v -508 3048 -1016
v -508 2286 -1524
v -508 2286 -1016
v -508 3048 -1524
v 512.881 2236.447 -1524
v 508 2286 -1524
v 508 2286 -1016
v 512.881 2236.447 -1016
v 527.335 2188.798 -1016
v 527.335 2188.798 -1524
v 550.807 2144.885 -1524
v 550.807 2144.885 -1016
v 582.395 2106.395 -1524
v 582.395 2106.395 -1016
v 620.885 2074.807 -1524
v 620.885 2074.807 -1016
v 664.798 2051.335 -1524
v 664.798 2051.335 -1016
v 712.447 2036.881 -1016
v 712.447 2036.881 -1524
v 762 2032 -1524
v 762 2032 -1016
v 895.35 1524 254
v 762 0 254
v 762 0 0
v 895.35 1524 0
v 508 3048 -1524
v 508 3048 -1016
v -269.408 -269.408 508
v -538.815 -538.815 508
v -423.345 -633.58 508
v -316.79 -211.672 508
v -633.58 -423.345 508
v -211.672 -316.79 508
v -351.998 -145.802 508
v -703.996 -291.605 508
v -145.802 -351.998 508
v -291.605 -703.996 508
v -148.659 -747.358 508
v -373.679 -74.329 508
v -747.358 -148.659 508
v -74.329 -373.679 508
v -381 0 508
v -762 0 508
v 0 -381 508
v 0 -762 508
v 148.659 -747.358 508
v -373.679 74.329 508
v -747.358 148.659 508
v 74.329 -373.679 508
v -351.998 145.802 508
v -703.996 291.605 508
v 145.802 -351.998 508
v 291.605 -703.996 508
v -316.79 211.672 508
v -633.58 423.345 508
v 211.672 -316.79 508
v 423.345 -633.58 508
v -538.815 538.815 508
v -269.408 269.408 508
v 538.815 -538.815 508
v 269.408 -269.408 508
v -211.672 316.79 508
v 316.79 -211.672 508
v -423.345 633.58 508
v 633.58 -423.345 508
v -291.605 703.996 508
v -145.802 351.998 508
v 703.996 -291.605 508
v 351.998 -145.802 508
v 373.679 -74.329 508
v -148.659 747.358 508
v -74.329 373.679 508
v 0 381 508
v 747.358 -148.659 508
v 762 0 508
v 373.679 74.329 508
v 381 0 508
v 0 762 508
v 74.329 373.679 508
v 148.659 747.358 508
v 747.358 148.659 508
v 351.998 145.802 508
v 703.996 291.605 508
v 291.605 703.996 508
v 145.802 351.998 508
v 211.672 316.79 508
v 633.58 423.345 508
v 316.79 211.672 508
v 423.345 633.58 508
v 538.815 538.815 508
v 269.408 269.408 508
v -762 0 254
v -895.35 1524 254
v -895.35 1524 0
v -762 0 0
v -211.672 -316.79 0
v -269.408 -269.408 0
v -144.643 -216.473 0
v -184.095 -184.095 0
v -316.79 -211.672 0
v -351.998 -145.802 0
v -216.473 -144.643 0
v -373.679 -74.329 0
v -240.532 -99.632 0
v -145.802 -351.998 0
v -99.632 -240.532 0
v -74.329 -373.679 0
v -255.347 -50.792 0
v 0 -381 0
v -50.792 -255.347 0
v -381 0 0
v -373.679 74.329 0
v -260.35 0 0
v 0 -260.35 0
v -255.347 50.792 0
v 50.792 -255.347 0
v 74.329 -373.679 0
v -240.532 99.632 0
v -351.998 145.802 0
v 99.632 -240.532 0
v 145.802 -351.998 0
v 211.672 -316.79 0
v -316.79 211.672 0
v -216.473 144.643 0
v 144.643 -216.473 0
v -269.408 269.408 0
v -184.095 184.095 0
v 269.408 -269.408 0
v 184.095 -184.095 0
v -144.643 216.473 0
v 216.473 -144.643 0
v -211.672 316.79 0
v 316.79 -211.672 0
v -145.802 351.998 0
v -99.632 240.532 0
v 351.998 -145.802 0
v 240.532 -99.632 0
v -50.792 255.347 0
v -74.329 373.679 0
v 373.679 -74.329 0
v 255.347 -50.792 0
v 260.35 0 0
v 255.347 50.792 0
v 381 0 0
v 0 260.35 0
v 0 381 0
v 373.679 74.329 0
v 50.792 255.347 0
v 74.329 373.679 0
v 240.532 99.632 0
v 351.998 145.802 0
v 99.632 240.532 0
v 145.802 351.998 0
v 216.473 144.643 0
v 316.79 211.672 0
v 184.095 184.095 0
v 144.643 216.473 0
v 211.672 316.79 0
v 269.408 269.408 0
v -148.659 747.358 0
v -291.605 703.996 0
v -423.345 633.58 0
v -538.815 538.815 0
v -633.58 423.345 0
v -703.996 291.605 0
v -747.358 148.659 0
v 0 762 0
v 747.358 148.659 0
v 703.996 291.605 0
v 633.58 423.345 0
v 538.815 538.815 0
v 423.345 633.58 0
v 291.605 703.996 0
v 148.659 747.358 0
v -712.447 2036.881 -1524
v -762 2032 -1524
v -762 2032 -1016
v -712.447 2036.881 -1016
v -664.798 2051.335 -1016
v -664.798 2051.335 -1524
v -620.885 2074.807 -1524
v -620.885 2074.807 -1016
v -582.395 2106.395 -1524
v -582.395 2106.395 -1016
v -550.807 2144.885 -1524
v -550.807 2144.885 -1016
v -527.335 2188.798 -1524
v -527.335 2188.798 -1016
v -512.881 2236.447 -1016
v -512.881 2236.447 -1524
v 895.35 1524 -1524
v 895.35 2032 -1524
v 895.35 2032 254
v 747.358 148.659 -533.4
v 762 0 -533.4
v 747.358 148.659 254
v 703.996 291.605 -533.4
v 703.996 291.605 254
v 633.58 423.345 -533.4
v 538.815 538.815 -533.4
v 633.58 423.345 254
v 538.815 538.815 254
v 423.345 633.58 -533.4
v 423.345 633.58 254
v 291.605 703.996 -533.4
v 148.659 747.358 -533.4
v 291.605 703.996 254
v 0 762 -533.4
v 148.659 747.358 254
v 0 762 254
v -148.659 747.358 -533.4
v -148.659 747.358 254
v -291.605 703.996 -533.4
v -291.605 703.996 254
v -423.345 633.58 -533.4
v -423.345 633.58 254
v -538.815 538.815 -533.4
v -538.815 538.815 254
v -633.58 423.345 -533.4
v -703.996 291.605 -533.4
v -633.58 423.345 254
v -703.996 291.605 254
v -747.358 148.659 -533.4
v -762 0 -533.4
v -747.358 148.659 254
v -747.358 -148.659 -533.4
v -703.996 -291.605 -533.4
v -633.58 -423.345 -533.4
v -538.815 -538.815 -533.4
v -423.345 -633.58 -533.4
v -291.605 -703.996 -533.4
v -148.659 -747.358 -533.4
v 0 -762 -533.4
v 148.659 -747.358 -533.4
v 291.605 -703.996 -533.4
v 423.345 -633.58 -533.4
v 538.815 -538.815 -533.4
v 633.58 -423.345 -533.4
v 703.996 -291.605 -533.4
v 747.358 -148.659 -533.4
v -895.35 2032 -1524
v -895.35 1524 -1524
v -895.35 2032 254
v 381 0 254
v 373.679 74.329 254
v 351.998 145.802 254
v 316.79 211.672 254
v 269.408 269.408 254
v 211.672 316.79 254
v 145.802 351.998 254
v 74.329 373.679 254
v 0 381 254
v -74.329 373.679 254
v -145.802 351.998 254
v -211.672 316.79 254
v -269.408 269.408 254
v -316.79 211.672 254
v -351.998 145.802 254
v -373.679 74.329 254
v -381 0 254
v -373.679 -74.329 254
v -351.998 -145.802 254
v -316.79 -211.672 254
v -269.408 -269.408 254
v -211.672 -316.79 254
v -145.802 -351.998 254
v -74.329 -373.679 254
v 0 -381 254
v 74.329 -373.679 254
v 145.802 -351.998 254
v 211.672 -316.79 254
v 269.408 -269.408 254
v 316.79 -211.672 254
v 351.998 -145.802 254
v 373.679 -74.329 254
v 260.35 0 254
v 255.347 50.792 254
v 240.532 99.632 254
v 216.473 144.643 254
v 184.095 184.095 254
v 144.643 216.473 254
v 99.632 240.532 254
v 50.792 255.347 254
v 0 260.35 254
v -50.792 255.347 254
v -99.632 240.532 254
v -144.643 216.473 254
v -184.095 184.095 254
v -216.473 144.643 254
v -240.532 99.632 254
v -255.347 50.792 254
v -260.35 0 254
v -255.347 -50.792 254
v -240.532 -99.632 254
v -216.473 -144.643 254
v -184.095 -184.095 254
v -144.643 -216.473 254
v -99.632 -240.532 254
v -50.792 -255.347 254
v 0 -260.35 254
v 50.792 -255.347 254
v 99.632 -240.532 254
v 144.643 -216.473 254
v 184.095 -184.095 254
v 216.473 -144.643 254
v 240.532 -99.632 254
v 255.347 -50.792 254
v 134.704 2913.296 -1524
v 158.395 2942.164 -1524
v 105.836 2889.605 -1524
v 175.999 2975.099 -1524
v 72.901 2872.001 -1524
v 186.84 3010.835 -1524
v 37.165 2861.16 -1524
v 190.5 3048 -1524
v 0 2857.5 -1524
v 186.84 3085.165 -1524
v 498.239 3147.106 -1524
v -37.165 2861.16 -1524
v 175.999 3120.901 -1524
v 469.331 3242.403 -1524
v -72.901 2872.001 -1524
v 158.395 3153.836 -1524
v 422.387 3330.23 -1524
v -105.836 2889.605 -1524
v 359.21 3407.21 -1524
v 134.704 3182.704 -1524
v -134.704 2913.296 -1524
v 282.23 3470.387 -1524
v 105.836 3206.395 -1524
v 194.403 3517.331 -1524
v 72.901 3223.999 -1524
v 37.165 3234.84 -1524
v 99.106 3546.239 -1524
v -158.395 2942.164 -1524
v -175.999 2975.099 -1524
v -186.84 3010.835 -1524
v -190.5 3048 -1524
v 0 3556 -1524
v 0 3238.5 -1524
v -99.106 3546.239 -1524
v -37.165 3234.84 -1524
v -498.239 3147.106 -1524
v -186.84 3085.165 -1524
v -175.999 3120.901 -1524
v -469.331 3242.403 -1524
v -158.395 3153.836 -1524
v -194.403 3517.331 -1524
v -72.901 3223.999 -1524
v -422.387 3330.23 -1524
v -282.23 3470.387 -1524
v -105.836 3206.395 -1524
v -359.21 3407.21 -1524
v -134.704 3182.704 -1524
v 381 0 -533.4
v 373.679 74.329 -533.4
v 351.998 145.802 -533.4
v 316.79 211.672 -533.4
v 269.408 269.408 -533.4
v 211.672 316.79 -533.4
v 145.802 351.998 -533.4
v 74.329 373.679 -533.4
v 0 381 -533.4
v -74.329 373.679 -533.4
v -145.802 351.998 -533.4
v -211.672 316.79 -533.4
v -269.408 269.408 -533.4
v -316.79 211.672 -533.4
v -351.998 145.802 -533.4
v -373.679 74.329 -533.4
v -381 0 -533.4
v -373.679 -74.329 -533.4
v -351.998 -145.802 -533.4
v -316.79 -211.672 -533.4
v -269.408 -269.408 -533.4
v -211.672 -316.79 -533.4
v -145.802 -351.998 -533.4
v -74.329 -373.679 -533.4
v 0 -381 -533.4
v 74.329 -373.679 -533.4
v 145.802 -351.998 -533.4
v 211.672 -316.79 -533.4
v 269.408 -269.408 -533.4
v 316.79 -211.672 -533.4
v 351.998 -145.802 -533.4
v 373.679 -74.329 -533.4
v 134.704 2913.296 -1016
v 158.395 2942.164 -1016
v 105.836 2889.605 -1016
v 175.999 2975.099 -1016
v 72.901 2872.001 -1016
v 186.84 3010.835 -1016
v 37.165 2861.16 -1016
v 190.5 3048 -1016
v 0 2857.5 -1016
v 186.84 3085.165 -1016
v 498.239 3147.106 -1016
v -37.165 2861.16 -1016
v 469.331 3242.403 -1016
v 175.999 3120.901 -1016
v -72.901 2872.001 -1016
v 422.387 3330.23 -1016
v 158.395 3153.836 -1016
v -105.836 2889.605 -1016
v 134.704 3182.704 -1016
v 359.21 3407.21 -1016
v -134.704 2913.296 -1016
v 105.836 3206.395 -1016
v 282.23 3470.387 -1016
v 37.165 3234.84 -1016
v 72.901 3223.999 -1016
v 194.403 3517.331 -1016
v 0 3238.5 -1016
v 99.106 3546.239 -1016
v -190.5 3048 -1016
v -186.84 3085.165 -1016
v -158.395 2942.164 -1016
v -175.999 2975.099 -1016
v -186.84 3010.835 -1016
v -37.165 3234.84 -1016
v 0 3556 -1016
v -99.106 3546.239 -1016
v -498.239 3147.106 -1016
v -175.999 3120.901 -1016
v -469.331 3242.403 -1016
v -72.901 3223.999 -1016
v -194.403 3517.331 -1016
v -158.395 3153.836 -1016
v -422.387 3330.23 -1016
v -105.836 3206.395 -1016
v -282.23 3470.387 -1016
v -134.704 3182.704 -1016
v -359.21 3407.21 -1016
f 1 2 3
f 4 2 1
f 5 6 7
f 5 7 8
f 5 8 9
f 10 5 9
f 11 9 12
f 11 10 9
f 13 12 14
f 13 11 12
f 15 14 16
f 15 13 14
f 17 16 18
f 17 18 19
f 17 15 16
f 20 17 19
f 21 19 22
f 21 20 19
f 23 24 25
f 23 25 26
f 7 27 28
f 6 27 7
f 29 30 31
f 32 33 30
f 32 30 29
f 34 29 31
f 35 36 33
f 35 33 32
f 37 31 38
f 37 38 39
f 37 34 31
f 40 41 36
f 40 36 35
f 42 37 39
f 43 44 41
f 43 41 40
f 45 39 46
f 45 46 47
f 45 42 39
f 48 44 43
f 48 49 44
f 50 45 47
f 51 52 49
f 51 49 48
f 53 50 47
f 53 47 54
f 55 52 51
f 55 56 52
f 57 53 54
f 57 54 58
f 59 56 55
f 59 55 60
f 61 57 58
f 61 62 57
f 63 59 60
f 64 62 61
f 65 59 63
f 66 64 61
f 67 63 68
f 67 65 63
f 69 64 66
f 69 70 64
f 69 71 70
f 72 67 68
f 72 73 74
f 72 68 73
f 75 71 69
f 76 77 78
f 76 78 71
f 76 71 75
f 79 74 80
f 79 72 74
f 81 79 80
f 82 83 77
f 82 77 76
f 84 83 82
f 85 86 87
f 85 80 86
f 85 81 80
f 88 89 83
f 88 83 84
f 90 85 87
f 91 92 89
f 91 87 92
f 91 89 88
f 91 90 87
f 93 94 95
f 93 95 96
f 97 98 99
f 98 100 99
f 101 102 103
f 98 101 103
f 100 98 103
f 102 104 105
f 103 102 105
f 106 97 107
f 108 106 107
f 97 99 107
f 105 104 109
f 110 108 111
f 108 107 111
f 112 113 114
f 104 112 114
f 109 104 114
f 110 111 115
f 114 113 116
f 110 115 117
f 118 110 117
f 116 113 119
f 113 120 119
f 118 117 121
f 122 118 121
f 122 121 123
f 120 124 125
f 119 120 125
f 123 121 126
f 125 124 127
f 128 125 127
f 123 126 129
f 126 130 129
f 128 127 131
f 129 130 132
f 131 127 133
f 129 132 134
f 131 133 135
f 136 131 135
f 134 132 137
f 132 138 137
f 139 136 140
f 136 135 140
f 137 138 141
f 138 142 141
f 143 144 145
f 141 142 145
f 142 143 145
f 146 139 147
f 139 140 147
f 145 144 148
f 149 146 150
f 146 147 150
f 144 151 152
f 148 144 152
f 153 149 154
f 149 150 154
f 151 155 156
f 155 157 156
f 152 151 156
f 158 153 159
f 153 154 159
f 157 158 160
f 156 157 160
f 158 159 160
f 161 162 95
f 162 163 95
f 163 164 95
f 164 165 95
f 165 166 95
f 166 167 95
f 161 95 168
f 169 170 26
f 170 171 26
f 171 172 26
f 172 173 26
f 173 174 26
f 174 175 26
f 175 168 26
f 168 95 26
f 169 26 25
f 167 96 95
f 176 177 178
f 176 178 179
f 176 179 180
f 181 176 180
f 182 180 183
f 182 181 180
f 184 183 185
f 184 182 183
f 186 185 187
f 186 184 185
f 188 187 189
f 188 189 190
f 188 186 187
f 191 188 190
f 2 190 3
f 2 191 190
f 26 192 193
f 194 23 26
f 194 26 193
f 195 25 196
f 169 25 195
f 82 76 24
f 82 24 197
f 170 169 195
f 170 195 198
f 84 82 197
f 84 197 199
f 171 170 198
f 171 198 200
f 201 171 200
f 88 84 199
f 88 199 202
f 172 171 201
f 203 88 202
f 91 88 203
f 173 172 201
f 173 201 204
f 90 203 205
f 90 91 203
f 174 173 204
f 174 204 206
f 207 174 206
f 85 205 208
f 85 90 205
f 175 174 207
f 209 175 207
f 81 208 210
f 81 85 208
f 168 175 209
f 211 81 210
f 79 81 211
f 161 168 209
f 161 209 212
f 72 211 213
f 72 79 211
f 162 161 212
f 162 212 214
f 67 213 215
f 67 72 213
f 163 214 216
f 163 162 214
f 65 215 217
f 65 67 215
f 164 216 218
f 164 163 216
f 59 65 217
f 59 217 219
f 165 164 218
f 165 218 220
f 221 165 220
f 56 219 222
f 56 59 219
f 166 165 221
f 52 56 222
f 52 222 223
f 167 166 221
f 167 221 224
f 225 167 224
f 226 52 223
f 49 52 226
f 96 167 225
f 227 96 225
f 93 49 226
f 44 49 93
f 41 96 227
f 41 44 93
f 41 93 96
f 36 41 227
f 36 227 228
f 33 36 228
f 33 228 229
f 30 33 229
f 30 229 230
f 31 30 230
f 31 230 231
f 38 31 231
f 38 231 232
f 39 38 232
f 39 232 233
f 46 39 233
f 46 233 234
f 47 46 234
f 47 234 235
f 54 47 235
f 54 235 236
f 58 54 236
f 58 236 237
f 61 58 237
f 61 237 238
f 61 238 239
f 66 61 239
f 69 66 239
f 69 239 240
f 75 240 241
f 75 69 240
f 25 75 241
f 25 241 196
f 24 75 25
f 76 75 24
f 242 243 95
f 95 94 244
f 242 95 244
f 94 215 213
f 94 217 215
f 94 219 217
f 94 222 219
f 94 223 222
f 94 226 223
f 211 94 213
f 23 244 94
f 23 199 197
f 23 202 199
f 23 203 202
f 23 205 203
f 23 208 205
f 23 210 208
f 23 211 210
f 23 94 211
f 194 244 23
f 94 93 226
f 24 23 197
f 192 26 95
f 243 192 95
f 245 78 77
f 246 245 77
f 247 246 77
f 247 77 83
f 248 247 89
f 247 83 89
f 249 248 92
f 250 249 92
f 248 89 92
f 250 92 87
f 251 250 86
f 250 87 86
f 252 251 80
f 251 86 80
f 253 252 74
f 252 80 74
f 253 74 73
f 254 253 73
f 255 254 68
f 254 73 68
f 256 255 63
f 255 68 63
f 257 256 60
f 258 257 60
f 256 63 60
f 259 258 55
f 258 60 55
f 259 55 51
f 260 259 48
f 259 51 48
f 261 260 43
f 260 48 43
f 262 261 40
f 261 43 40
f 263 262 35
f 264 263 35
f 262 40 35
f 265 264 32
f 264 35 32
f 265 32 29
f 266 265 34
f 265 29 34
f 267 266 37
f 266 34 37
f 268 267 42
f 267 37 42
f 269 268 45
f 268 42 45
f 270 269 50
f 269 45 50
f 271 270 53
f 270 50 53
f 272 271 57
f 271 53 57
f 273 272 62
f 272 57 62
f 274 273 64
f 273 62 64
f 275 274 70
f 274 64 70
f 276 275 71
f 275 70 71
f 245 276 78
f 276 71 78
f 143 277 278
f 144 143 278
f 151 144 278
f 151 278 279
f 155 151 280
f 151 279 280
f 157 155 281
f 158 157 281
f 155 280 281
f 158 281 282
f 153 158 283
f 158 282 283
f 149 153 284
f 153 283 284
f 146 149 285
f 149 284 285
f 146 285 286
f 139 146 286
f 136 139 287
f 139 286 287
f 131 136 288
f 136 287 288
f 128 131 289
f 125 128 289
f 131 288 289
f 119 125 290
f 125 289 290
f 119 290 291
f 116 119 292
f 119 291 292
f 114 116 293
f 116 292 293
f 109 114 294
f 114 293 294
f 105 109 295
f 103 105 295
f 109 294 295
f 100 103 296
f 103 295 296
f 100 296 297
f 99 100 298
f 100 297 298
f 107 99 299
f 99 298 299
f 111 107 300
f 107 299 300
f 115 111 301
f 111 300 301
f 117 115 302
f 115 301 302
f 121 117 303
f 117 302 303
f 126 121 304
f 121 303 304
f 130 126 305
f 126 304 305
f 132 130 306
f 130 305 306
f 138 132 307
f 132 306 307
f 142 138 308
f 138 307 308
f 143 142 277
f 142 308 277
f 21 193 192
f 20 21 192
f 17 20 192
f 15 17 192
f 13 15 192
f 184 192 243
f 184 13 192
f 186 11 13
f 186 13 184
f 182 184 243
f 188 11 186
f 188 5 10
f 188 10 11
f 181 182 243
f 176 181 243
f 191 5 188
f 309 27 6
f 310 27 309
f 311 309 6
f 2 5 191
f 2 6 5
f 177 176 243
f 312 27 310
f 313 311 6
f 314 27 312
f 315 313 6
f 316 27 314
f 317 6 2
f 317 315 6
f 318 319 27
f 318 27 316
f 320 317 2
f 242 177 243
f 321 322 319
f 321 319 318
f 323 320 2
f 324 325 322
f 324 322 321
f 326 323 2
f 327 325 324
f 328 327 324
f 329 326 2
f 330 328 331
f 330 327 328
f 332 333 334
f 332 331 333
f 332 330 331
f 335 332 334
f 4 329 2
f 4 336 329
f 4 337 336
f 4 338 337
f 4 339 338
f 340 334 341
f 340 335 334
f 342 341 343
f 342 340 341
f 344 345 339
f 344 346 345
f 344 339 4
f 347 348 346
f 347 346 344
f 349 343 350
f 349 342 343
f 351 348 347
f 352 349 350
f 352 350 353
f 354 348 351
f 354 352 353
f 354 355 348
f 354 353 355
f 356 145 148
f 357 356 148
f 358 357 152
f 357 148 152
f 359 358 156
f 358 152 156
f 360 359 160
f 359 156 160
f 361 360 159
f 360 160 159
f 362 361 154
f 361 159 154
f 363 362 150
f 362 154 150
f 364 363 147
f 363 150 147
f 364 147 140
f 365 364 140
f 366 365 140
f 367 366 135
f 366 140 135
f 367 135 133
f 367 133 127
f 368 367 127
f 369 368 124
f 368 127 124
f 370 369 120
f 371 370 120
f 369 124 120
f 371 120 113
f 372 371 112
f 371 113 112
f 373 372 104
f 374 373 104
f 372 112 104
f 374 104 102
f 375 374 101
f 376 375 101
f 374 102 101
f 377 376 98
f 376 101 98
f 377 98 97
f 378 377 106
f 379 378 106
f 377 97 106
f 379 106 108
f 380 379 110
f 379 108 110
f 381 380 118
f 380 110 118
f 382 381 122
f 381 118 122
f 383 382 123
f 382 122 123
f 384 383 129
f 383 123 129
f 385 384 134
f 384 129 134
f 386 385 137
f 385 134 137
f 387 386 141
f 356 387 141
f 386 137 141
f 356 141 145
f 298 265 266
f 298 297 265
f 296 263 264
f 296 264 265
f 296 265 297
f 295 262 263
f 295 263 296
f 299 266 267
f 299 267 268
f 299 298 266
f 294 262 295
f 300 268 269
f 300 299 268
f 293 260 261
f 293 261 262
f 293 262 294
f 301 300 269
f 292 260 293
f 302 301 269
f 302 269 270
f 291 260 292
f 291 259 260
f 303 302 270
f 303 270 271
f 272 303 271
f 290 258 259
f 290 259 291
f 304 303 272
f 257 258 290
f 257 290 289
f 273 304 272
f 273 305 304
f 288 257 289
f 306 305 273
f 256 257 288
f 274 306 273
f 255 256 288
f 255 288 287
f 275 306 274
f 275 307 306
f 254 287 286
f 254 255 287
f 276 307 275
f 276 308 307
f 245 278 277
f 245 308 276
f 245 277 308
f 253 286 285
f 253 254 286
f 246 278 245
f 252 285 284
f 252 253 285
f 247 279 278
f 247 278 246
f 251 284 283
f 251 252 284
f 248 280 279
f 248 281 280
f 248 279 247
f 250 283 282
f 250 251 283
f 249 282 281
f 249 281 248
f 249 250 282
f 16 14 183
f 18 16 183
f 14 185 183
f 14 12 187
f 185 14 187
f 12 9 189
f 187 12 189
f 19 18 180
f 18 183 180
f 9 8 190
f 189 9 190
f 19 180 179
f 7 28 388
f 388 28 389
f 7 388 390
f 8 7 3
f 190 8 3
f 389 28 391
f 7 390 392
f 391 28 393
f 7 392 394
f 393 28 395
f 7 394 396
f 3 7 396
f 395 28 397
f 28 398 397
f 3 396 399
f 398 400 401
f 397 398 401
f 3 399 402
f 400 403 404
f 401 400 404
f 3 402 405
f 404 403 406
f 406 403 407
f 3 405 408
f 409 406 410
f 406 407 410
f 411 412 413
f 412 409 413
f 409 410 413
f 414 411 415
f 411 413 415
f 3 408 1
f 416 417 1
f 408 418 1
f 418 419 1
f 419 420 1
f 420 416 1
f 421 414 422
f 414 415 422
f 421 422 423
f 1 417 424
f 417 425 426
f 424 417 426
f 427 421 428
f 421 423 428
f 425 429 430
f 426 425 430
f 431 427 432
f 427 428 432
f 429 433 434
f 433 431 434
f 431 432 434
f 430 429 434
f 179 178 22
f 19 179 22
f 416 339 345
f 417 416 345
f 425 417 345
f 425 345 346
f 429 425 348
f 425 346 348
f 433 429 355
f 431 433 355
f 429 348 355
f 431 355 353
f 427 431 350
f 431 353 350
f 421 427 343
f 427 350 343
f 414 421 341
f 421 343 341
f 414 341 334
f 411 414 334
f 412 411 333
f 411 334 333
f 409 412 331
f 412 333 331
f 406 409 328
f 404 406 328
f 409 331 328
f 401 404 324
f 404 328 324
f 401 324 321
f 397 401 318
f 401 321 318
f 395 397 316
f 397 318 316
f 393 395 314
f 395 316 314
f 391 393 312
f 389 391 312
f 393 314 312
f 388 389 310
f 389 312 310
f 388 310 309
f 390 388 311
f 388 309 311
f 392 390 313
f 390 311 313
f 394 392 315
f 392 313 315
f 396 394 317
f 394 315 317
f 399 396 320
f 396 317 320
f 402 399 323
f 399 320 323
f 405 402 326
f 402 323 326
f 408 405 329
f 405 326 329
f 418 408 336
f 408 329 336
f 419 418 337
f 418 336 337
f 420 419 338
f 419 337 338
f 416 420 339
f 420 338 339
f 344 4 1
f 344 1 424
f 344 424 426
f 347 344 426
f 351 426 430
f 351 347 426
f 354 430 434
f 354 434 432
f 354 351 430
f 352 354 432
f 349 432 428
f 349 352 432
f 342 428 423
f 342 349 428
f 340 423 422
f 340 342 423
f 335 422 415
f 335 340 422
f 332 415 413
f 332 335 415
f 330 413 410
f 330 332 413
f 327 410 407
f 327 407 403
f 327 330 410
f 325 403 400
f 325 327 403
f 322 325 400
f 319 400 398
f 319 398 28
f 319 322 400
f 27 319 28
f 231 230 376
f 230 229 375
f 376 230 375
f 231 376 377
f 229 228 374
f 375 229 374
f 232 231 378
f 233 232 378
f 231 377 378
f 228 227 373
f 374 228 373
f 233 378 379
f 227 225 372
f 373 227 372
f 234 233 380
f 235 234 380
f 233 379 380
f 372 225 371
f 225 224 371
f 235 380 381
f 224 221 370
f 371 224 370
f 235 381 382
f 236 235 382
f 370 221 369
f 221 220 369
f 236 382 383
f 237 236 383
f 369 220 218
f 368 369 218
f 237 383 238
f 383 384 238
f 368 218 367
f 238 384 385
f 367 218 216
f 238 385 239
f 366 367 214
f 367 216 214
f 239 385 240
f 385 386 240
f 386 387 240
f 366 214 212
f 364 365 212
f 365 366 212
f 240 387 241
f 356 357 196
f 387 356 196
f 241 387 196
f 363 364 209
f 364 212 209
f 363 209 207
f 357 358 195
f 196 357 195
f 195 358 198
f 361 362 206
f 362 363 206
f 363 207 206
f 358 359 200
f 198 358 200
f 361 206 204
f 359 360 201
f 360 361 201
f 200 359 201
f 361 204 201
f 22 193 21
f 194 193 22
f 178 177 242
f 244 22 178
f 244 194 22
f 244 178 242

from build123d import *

# Parameters (mm, degrees)
SKETCH1_R           = 762
SKETCH1_R_2         = 381
BOSS_EXTRUDE1_DEPTH = 533.4
BOSS_EXTRUDE3_START = 254
BOSS_EXTRUDE3_DEPTH = 254
SKETCH6_R           = 260.35
CUT_EXTRUDE1_DEPTH  = 254
BOSS_EXTRUDE4_START = 254
SKETCH7_R           = 762
SKETCH7_R_2         = 381
BOSS_EXTRUDE4_DEPTH = 254
SKETCH8_W           = 1790.7
SKETCH8_H           = 508
BOSS_EXTRUDE5_DEPTH = 1524
BOSS_EXTRUDE6_DEPTH = 508
SKETCH10_R          = 190.5
CUT_EXTRUDE2_DEPTH  = 508


with BuildPart() as part:
    # Sketch1 → Boss-Extrude1 (new body)
    with BuildSketch(Plane.XY):
        Circle(SKETCH1_R)
        Circle(SKETCH1_R_2, mode=Mode.SUBTRACT)
    extrude(amount=-BOSS_EXTRUDE1_DEPTH)

    # Sketch3 → Boss-Extrude3 (add)
    with BuildSketch(Plane.XY.offset(BOSS_EXTRUDE3_START)):
        with BuildLine():
            Line((-895.35, 2032), (-895.35, 1524))
            Line((-895.35, 1524), (-762, 0))
            ThreePointArc((-762, 0), (0, -762), (762, 0))
            Line((762, 0), (895.35, 1524))
            Line((895.35, 1524), (895.35, 2032))
            Line((895.35, 2032), (-895.35, 2032))
        make_face()
    extrude(amount=-BOSS_EXTRUDE3_DEPTH)

    # Sketch6 → Cut-Extrude1 (cut)
    with BuildSketch(Plane.XY.offset(254)):
        Circle(SKETCH6_R)
    extrude(amount=-CUT_EXTRUDE1_DEPTH, mode=Mode.SUBTRACT)

    # Sketch7 → Boss-Extrude4 (add)
    with BuildSketch(Plane.XY.offset(254).offset(BOSS_EXTRUDE4_START)):
        Circle(SKETCH7_R)
        Circle(SKETCH7_R_2, mode=Mode.SUBTRACT)
    extrude(amount=-BOSS_EXTRUDE4_DEPTH)

    # Sketch8 → Boss-Extrude5 (add)
    with BuildSketch(Plane(origin=(0, 0, 0), x_dir=(-1, 0, 0), z_dir=(0, 0, -1))):
        with Locations((0, 1778)):
            Rectangle(SKETCH8_W, SKETCH8_H)
    extrude(amount=BOSS_EXTRUDE5_DEPTH)

    # Sketch9 → Boss-Extrude6 (add)
    with BuildSketch(Plane(origin=(0, 0, -1524), x_dir=(-1, 0, 0), z_dir=(0, 0, -1))):
        with BuildLine():
            Line((-508, 3048), (-508, 2286))
            ThreePointArc((-508, 2286), (-582.394877579, 2106.394877579), (-762, 2032))
            Line((-762, 2032), (-895.35, 2032))
            Line((-895.35, 2032), (-895.35, 1524))
            Line((-895.35, 1524), (895.35, 1524))
            Line((895.35, 1524), (895.35, 2032))
            Line((895.35, 2032), (762, 2032))
            ThreePointArc((762, 2032), (582.394877579, 2106.394877579), (508, 2286))
            Line((508, 2286), (508, 3048))
            ThreePointArc((508, 3048), (0, 3556), (-508, 3048))
        make_face()
    extrude(amount=-BOSS_EXTRUDE6_DEPTH)

    # Sketch10 → Cut-Extrude2 (cut)
    with BuildSketch(Plane(origin=(0, 0, -1524), x_dir=(-1, 0, 0), z_dir=(0, 0, -1))):
        with Locations((0, 3048)):
            Circle(SKETCH10_R)
    extrude(amount=-CUT_EXTRUDE2_DEPTH, mode=Mode.SUBTRACT)


solid = part.part
